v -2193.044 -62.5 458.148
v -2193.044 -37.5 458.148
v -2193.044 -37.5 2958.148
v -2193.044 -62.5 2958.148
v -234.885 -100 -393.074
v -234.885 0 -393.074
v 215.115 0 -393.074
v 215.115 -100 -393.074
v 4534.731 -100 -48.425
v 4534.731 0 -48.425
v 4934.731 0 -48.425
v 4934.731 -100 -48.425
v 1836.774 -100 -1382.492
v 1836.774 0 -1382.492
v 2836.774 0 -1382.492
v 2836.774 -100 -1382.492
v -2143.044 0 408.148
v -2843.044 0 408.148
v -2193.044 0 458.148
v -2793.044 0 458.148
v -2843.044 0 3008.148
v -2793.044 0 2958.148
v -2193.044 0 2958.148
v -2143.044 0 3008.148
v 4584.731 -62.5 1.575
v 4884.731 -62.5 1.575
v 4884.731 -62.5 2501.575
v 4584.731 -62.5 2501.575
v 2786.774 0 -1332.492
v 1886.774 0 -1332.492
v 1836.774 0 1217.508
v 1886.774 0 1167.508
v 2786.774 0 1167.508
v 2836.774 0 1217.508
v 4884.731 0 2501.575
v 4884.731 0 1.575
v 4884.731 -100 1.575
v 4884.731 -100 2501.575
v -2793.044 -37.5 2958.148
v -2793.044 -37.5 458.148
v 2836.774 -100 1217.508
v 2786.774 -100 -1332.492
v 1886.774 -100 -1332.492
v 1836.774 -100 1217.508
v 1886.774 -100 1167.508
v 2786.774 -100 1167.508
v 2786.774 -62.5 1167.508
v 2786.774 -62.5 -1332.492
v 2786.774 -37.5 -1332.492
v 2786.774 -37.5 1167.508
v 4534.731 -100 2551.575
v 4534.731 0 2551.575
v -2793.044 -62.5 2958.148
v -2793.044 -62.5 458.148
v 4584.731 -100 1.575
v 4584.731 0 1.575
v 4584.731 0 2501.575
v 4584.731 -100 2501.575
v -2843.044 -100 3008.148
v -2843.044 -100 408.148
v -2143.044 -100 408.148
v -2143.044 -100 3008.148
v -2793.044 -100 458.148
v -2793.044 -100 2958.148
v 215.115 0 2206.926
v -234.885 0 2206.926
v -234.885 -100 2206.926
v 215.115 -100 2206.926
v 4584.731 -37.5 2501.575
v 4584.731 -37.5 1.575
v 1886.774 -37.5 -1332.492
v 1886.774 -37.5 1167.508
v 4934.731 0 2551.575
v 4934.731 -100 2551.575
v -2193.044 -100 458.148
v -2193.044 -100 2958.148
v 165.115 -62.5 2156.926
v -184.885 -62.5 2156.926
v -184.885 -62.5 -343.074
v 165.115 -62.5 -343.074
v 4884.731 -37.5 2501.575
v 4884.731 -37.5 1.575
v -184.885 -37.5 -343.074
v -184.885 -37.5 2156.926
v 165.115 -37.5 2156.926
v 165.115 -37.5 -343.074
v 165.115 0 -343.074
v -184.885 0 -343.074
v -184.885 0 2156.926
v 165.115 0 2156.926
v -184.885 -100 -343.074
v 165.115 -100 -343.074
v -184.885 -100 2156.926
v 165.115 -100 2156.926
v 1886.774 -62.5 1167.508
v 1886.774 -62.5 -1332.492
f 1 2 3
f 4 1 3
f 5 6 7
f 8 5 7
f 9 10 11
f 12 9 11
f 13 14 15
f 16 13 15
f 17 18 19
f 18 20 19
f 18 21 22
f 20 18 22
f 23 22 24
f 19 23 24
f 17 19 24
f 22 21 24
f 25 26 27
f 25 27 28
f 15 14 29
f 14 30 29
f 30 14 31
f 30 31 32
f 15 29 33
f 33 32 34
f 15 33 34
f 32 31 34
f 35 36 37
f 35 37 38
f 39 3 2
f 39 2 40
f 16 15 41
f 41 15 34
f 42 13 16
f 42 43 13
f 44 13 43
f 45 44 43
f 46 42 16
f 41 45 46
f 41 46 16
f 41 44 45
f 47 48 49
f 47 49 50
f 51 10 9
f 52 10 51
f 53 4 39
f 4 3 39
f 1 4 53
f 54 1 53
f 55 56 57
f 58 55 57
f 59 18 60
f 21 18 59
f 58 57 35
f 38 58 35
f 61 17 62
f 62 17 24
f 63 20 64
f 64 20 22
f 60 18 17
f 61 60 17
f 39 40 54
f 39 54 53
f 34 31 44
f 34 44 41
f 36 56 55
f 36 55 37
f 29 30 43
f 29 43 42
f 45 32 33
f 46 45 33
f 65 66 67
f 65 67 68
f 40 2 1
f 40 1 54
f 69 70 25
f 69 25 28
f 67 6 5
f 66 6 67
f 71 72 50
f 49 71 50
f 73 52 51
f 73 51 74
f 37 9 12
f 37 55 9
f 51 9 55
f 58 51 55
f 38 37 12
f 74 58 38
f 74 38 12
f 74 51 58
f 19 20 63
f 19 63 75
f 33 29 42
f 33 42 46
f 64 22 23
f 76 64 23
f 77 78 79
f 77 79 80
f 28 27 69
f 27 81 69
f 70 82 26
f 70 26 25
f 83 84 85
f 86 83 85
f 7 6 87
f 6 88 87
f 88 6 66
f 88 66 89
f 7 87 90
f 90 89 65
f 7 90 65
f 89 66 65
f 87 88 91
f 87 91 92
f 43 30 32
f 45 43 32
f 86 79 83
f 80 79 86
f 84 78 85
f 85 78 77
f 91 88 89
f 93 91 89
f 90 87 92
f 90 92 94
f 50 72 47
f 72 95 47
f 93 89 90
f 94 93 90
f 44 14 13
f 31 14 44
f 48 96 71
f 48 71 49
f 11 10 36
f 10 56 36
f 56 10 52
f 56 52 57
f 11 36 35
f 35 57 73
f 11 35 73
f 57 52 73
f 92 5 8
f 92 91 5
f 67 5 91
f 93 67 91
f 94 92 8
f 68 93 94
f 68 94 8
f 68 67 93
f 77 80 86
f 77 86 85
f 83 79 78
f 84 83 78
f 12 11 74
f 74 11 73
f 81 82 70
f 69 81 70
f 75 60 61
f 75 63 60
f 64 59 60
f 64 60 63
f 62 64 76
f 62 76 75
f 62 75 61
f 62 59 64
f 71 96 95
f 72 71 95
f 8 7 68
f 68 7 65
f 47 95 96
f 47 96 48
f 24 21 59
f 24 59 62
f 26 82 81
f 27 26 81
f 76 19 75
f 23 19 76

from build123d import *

# Parameters (mm, degrees)
F0_W      = 450
F0_H      = 2600
F0_W_2    = 350
F0_H_2    = 2500
F1_DEPTH  = 100
F3_W      = 350
F3_H      = 2500
F4_DEPTH  = 12.5
F5_W      = 700
F5_H      = 2600
F5_W_2    = 600
F5_H_2    = 2500
F6_DEPTH  = 100
F8_W      = 600
F8_H      = 2500
F9_DEPTH  = 12.5
F10_W     = 400
F10_H     = 2600
F10_W_2   = 300
F10_H_2   = 2500
F11_DEPTH = 100
F13_W     = 300
F13_H     = 2500
F14_DEPTH = 12.5
F15_W     = 1000
F15_H     = 2600
F15_W_2   = 900
F15_H_2   = 2500
F16_DEPTH = 100
F18_W     = 900
F18_H     = 2500
F19_DEPTH = 12.5


with BuildPart() as f1:
    # F0 (on Front) → F1 (new body)
    with BuildSketch(Plane.XZ):
        with Locations((-9.8851267248, 906.9261944562)):
            Rectangle(F0_W, F0_H)
        with Locations((-9.8851267248, 906.9261944562)):
            Rectangle(F0_W_2, F0_H_2, mode=Mode.SUBTRACT)
    extrude(amount=F1_DEPTH)


with BuildPart() as f4:
    # F3 (on mid) → F4 (new body, symmetric)
    with BuildSketch(Plane.XZ.offset(50)):
        with Locations((-9.8851267248, 906.9261944562)):
            Rectangle(F3_W, F3_H)
    extrude(amount=F4_DEPTH, both=True)


with BuildPart() as f6:
    # F5 (on Front) → F6 (new body)
    with BuildSketch(Plane.XZ):
        with Locations((-2493.0438446999, 1708.1477986987)):
            Rectangle(F5_W, F5_H)
        with Locations((-2493.0438446999, 1708.1477986987)):
            Rectangle(F5_W_2, F5_H_2, mode=Mode.SUBTRACT)
    extrude(amount=F6_DEPTH)


with BuildPart() as f9:
    # F8 (on mid) → F9 (new body, symmetric)
    with BuildSketch(Plane(origin=(0, -50, 0), x_dir=(-1, 0, 0), z_dir=(0, 1, 0))):
        with Locations((2493.0438446999, 1708.1477986987)):
            Rectangle(F8_W, F8_H)
    extrude(amount=F9_DEPTH, both=True)


with BuildPart() as f11:
    # F10 (on Front) → F11 (new body)
    with BuildSketch(Plane.XZ):
        with Locations((4734.7310781479, 1251.5747024048)):
            Rectangle(F10_W, F10_H)
        with Locations((4734.7310781479, 1251.5747024048)):
            Rectangle(F10_W_2, F10_H_2, mode=Mode.SUBTRACT)
    extrude(amount=F11_DEPTH)


with BuildPart() as f14:
    # F13 (on mid) → F14 (new body, symmetric)
    with BuildSketch(Plane(origin=(0, -50, 0), x_dir=(-1, 0, 0), z_dir=(0, 1, 0))):
        with Locations((-4734.7310781479, 1251.5747024048)):
            Rectangle(F13_W, F13_H)
    extrude(amount=F14_DEPTH, both=True)


with BuildPart() as f16:
    # F15 (on Front) → F16 (new body)
    with BuildSketch(Plane.XZ):
        with Locations((2336.7742300034, -82.4915404867)):
            Rectangle(F15_W, F15_H)
        with Locations((2336.7742300034, -82.4915404867)):
            Rectangle(F15_W_2, F15_H_2, mode=Mode.SUBTRACT)
    extrude(amount=F16_DEPTH)


with BuildPart() as f19:
    # F18 (on mid) → F19 (new body, symmetric)
    with BuildSketch(Plane.XZ.offset(50)):
        with Locations((2336.7742300034, -82.4915404867)):
            Rectangle(F18_W, F18_H)
    extrude(amount=F19_DEPTH, both=True)


solid = Compound([f1.part, f4.part, f6.part, f9.part, f11.part, f14.part, f16.part, f19.part])
